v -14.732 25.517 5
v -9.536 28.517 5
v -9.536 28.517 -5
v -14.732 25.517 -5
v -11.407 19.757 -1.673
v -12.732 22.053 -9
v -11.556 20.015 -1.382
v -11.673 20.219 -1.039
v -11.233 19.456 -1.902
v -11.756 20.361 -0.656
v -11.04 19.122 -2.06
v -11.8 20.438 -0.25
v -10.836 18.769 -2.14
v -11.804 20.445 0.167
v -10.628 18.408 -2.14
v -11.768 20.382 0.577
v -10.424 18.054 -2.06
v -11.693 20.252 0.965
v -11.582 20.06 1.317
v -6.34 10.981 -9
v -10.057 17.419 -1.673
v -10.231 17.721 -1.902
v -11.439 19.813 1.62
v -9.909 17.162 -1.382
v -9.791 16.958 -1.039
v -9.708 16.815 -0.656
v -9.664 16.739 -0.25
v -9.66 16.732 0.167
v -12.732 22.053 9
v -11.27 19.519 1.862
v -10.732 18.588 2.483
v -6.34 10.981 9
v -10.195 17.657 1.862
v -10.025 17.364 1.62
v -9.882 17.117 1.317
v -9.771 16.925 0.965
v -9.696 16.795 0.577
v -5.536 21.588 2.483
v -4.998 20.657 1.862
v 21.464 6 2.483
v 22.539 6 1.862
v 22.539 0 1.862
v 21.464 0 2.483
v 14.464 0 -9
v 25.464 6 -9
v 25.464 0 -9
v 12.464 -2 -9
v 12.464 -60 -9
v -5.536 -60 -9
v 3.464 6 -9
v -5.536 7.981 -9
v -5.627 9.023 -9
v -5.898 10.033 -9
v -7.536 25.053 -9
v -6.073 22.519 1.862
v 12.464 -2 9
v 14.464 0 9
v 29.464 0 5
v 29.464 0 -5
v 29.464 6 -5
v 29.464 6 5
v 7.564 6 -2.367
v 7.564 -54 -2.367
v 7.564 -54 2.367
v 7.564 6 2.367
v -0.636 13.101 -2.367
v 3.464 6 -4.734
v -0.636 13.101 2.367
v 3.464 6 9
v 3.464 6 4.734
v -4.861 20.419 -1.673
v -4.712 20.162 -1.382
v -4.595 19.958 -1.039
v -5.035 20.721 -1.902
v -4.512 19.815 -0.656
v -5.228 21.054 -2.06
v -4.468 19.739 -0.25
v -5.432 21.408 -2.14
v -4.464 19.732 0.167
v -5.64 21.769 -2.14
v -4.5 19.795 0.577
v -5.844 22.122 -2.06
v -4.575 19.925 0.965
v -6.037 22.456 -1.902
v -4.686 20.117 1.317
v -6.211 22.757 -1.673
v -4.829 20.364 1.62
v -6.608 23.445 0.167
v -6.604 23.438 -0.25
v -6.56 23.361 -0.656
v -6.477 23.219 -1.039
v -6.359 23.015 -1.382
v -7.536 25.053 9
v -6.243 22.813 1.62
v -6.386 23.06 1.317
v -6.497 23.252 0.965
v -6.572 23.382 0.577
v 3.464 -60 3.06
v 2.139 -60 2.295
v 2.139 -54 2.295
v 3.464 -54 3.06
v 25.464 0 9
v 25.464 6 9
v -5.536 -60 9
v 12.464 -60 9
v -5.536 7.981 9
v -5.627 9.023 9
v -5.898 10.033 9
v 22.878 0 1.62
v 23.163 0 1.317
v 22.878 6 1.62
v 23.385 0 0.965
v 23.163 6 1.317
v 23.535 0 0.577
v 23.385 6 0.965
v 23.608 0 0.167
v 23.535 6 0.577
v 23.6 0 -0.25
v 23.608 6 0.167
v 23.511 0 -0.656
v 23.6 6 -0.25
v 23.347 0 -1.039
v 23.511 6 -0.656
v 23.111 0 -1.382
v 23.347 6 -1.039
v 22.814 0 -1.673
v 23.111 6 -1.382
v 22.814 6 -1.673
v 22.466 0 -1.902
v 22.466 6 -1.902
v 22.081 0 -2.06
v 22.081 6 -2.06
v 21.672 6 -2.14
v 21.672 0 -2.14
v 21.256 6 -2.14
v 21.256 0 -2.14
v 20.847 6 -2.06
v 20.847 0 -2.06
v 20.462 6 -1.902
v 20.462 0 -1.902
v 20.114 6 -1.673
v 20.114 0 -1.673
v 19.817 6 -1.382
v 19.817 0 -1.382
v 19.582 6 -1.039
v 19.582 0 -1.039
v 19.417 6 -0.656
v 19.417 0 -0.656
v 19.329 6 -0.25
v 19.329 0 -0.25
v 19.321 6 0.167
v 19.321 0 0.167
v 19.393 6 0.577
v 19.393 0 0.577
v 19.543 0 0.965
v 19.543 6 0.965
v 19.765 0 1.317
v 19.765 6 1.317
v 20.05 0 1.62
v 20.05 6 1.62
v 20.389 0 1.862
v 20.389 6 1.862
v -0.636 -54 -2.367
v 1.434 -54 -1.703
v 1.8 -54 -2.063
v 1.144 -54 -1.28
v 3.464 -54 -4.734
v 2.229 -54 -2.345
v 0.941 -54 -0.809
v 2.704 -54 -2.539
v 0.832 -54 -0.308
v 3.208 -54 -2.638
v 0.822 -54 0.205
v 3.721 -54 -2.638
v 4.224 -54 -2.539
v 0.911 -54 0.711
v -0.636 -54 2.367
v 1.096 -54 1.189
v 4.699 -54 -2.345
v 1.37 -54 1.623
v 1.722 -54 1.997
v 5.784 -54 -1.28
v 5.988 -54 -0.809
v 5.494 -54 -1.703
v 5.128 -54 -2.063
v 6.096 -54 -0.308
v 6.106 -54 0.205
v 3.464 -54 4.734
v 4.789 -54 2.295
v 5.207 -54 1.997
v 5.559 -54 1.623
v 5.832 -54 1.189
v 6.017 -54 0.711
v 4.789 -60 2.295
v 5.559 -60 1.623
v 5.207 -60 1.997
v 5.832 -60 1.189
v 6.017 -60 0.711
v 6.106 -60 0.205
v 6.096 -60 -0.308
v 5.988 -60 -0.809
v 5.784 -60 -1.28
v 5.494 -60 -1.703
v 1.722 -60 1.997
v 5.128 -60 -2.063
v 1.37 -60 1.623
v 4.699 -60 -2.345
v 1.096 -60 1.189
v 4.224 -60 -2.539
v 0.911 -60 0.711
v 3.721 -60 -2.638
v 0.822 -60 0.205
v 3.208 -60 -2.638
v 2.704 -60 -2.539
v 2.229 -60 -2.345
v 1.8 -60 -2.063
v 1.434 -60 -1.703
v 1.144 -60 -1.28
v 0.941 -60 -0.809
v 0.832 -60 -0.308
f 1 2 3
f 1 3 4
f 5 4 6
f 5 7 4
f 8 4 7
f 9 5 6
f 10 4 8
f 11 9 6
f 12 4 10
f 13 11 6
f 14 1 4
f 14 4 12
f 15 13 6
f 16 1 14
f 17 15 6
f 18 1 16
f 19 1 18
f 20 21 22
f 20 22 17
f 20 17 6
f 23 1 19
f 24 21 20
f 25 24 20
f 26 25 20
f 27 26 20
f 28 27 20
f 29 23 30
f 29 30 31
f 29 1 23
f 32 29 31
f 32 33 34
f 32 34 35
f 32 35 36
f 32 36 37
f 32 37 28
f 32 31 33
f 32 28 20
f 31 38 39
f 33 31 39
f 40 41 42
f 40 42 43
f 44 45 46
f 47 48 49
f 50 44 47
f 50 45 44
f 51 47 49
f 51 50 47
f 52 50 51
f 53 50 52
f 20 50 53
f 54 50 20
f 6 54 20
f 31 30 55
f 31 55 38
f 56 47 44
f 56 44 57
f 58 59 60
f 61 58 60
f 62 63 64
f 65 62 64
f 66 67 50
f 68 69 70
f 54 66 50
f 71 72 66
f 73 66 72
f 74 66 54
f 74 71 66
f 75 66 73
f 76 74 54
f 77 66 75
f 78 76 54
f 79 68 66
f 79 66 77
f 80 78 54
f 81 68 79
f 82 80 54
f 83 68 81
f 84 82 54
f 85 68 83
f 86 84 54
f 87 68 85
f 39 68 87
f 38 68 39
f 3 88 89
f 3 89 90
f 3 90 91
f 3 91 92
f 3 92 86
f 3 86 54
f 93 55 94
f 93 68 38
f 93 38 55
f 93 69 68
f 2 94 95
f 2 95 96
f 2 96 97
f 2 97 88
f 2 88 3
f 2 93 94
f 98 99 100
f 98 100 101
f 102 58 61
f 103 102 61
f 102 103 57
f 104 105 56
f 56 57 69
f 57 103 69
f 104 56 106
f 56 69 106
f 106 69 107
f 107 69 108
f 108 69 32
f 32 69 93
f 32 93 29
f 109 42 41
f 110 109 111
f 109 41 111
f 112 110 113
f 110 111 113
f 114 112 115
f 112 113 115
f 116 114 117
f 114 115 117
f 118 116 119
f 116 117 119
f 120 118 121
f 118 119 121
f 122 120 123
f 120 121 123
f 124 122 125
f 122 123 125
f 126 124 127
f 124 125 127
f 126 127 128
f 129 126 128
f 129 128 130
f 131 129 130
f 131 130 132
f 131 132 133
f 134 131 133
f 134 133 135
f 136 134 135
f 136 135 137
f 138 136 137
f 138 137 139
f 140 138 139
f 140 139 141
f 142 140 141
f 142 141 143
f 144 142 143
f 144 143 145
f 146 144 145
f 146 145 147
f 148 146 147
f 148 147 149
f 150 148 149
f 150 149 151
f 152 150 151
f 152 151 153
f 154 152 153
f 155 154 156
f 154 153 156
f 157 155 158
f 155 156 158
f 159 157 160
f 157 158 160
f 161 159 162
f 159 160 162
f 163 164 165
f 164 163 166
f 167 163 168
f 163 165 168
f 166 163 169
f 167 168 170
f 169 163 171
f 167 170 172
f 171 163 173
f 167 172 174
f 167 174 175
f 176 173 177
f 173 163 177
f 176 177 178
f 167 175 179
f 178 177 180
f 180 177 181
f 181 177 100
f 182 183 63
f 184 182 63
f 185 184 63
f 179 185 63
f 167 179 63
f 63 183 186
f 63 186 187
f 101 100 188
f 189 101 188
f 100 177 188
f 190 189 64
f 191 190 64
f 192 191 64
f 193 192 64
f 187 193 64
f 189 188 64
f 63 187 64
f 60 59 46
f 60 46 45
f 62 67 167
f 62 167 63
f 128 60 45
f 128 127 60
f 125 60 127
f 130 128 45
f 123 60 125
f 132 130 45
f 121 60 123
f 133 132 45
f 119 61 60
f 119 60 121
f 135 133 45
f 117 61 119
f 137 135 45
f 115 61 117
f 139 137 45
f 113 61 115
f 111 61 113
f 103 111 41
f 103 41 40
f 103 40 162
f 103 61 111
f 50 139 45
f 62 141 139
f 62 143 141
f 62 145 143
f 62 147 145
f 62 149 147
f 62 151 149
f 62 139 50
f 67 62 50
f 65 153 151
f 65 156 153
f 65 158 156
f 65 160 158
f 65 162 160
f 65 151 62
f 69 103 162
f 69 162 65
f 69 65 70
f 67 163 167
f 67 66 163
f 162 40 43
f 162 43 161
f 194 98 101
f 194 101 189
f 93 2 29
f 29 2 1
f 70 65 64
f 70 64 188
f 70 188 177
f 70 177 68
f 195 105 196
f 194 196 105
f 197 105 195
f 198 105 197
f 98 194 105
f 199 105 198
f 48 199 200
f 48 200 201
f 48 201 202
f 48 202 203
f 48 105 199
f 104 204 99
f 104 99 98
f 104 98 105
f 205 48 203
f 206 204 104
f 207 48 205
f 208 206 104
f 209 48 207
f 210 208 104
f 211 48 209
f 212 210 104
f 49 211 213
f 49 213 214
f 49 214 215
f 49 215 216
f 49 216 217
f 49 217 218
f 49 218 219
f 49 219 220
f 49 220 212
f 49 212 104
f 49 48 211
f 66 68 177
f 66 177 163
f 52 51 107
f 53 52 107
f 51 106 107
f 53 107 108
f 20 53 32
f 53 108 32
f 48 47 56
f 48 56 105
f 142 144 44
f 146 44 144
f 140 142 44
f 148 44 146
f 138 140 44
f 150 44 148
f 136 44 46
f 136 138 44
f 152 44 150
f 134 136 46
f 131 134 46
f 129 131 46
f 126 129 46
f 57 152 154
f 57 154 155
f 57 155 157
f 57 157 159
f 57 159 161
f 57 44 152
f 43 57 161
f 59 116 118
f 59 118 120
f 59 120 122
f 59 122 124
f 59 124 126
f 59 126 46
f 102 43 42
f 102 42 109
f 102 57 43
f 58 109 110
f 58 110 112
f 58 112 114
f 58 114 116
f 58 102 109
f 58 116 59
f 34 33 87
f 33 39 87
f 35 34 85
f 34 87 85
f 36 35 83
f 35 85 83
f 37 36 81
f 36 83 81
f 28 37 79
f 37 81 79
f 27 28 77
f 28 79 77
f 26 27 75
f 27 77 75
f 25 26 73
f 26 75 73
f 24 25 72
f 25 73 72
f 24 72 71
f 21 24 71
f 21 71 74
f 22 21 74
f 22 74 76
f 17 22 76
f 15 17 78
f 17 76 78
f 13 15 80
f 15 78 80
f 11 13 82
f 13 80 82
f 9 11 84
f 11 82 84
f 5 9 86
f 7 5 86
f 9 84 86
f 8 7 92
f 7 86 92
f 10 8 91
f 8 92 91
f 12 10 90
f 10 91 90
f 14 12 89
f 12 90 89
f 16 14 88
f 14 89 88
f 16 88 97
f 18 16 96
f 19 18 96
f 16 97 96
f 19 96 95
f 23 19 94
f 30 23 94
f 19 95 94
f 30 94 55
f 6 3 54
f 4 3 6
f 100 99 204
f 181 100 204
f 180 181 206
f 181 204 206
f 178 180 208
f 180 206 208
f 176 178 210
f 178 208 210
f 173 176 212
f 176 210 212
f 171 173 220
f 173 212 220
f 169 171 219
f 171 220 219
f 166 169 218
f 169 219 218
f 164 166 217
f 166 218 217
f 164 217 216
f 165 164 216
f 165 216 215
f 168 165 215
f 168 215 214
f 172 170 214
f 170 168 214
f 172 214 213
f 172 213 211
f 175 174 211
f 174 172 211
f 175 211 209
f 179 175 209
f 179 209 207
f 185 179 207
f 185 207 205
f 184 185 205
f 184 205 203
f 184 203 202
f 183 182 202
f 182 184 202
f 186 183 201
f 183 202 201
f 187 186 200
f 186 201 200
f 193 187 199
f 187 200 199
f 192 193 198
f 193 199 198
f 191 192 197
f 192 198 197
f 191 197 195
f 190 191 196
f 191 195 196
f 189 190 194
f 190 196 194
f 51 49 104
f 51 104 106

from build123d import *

# Parameters (mm, degrees)
BOSS_EXTRUDE1_DEPTH = 9
SKETCH2_R           = 2.15
CUT_EXTRUDE1_DEPTH  = 39.159314511
SKETCH3_R           = 2.15
CUT_EXTRUDE2_DEPTH  = 37.346022079
BOSS_EXTRUDE2_DEPTH = 18
CHAMFER1_SIZE       = 4
CHAMFER2_SIZE       = 2
FILLET1_R           = 6
CUT_EXTRUDE3_DEPTH  = 69.109715592
CUT_EXTRUDE4_DEPTH  = 73.836345899
SKETCH7_R           = 2.65
CUT_EXTRUDE5_DEPTH  = 94.724769777
CUT_EXTRUDE6_START  = -6
CUT_EXTRUDE6_DEPTH  = 88.724769777
CUT_EXTRUDE7_DEPTH  = 94.724769777


with BuildPart() as part:
    # Sketch1 → Boss-Extrude1 (new, symmetric)
    with BuildSketch(Plane.XY):
        Polygon((-14.732050808, 25.516660498), (0, 0), (29.464101615, 0), (29.464101615, 6), (3.464101615, 6), (-9.535898385, 28.516660498), align=None)
    extrude(amount=BOSS_EXTRUDE1_DEPTH, both=True)

    # Sketch2 → Cut-Extrude1 (cut, through all)
    with BuildSketch(Plane(origin=(0, 6, 0), x_dir=(1, 0, 0), z_dir=(0, 1, 0))):
        with Locations(Location((21.464101615, 0, 0), (0, 0, 270))):
            Circle(SKETCH2_R)
    extrude(amount=-CUT_EXTRUDE1_DEPTH, mode=Mode.SUBTRACT)

    # Sketch3 → Cut-Extrude2 (cut, through all)
    with BuildSketch(Plane(origin=(5.196152423, 3, 0), x_dir=(0, 0, -1), z_dir=(0.8660254037844397, 0.499999999999998, 0))):
        with Locations(Location((0, 21.464101615, 0), (0, 0, 90))):
            Circle(SKETCH3_R)
    extrude(amount=-CUT_EXTRUDE2_DEPTH, mode=Mode.SUBTRACT)

    # Sketch4 → Boss-Extrude2 (add)
    with BuildSketch(Plane(origin=(0, 0, -9), x_dir=(-1, 0, 0), z_dir=(0, 0, -1))):
        Polygon((0, 0), (-12.464101615, 0), (-12.464101615, -60), (5.535898385, -60), (5.535898385, 9.588457268), align=None)
    extrude(amount=-BOSS_EXTRUDE2_DEPTH)

    # Chamfer1
    chamfer1_edges = [part.edges().sort_by_distance(p)[0] for p in [
        (29.464101615, 3, 9),
        (-12.133974596, 27.016660498, 9),
        (29.464101615, 3, -9),
        (-12.133974596, 27.016660498, -9),
    ]]
    chamfer(chamfer1_edges, length=CHAMFER1_SIZE)

    # Chamfer2
    chamfer2_edges = [part.edges().sort_by_distance(p)[0] for p in [
        (12.464101615, 0, 0),
    ]]
    chamfer(chamfer2_edges, length=CHAMFER2_SIZE)

    # Fillet1
    fillet1_edges = [part.edges().sort_by_distance(p)[0] for p in [
        (-5.535898385, 9.588457268, 0),
    ]]
    fillet(fillet1_edges, radius=FILLET1_R)

    # Sketch5 → Cut-Extrude3 (cut, through all)
    with BuildSketch(Plane(origin=(5.196152423, 3, 0), x_dir=(0, 0, -1), z_dir=(0.8660254037844397, 0.4999999999999981, 0))):
        Polygon((-1.861954618, 22.539101615), (-2.482606158, 21.464101615), (-1.861954618, 20.389101615), align=None)
    extrude(amount=-CUT_EXTRUDE3_DEPTH, mode=Mode.SUBTRACT)

    # Sketch6 → Cut-Extrude4 (cut, through all)
    with BuildSketch(Plane(origin=(0, 6, 0), x_dir=(1, 0, 0), z_dir=(0, 1, 0))):
        Polygon((22.539101615, -1.861954618), (21.464101615, -2.482606158), (20.389101615, -1.861954618), align=None)
    extrude(amount=-CUT_EXTRUDE4_DEPTH, mode=Mode.SUBTRACT)

    # Sketch7 → Cut-Extrude5 (cut, through all)
    with BuildSketch(Plane.XZ.offset(60)):
        with Locations(Location((3.464101615, 0, 0), (0, 0, 270))):
            Circle(SKETCH7_R)
    extrude(amount=-CUT_EXTRUDE5_DEPTH, mode=Mode.SUBTRACT)

    # Sketch8 → Cut-Extrude6 (cut, through all)
    with BuildSketch(Plane.XZ.offset(60).offset(CUT_EXTRUDE6_START)):
        Polygon((3.464101615, 4.734272207), (-0.635898385, 2.367136104), (-0.635898385, -2.367136104), (3.464101615, -4.734272207), (7.564101615, -2.367136104), (7.564101615, 2.367136104), align=None)
    extrude(amount=-CUT_EXTRUDE6_DEPTH, mode=Mode.SUBTRACT)

    # Sketch10 → Cut-Extrude7 (cut, through all)
    with BuildSketch(Plane.XZ.offset(60)):
        Polygon((2.139101615, 2.29496732), (3.464101615, 3.059956427), (4.789101615, 2.29496732), align=None)
    extrude(amount=-CUT_EXTRUDE7_DEPTH, mode=Mode.SUBTRACT)


solid = part.part
